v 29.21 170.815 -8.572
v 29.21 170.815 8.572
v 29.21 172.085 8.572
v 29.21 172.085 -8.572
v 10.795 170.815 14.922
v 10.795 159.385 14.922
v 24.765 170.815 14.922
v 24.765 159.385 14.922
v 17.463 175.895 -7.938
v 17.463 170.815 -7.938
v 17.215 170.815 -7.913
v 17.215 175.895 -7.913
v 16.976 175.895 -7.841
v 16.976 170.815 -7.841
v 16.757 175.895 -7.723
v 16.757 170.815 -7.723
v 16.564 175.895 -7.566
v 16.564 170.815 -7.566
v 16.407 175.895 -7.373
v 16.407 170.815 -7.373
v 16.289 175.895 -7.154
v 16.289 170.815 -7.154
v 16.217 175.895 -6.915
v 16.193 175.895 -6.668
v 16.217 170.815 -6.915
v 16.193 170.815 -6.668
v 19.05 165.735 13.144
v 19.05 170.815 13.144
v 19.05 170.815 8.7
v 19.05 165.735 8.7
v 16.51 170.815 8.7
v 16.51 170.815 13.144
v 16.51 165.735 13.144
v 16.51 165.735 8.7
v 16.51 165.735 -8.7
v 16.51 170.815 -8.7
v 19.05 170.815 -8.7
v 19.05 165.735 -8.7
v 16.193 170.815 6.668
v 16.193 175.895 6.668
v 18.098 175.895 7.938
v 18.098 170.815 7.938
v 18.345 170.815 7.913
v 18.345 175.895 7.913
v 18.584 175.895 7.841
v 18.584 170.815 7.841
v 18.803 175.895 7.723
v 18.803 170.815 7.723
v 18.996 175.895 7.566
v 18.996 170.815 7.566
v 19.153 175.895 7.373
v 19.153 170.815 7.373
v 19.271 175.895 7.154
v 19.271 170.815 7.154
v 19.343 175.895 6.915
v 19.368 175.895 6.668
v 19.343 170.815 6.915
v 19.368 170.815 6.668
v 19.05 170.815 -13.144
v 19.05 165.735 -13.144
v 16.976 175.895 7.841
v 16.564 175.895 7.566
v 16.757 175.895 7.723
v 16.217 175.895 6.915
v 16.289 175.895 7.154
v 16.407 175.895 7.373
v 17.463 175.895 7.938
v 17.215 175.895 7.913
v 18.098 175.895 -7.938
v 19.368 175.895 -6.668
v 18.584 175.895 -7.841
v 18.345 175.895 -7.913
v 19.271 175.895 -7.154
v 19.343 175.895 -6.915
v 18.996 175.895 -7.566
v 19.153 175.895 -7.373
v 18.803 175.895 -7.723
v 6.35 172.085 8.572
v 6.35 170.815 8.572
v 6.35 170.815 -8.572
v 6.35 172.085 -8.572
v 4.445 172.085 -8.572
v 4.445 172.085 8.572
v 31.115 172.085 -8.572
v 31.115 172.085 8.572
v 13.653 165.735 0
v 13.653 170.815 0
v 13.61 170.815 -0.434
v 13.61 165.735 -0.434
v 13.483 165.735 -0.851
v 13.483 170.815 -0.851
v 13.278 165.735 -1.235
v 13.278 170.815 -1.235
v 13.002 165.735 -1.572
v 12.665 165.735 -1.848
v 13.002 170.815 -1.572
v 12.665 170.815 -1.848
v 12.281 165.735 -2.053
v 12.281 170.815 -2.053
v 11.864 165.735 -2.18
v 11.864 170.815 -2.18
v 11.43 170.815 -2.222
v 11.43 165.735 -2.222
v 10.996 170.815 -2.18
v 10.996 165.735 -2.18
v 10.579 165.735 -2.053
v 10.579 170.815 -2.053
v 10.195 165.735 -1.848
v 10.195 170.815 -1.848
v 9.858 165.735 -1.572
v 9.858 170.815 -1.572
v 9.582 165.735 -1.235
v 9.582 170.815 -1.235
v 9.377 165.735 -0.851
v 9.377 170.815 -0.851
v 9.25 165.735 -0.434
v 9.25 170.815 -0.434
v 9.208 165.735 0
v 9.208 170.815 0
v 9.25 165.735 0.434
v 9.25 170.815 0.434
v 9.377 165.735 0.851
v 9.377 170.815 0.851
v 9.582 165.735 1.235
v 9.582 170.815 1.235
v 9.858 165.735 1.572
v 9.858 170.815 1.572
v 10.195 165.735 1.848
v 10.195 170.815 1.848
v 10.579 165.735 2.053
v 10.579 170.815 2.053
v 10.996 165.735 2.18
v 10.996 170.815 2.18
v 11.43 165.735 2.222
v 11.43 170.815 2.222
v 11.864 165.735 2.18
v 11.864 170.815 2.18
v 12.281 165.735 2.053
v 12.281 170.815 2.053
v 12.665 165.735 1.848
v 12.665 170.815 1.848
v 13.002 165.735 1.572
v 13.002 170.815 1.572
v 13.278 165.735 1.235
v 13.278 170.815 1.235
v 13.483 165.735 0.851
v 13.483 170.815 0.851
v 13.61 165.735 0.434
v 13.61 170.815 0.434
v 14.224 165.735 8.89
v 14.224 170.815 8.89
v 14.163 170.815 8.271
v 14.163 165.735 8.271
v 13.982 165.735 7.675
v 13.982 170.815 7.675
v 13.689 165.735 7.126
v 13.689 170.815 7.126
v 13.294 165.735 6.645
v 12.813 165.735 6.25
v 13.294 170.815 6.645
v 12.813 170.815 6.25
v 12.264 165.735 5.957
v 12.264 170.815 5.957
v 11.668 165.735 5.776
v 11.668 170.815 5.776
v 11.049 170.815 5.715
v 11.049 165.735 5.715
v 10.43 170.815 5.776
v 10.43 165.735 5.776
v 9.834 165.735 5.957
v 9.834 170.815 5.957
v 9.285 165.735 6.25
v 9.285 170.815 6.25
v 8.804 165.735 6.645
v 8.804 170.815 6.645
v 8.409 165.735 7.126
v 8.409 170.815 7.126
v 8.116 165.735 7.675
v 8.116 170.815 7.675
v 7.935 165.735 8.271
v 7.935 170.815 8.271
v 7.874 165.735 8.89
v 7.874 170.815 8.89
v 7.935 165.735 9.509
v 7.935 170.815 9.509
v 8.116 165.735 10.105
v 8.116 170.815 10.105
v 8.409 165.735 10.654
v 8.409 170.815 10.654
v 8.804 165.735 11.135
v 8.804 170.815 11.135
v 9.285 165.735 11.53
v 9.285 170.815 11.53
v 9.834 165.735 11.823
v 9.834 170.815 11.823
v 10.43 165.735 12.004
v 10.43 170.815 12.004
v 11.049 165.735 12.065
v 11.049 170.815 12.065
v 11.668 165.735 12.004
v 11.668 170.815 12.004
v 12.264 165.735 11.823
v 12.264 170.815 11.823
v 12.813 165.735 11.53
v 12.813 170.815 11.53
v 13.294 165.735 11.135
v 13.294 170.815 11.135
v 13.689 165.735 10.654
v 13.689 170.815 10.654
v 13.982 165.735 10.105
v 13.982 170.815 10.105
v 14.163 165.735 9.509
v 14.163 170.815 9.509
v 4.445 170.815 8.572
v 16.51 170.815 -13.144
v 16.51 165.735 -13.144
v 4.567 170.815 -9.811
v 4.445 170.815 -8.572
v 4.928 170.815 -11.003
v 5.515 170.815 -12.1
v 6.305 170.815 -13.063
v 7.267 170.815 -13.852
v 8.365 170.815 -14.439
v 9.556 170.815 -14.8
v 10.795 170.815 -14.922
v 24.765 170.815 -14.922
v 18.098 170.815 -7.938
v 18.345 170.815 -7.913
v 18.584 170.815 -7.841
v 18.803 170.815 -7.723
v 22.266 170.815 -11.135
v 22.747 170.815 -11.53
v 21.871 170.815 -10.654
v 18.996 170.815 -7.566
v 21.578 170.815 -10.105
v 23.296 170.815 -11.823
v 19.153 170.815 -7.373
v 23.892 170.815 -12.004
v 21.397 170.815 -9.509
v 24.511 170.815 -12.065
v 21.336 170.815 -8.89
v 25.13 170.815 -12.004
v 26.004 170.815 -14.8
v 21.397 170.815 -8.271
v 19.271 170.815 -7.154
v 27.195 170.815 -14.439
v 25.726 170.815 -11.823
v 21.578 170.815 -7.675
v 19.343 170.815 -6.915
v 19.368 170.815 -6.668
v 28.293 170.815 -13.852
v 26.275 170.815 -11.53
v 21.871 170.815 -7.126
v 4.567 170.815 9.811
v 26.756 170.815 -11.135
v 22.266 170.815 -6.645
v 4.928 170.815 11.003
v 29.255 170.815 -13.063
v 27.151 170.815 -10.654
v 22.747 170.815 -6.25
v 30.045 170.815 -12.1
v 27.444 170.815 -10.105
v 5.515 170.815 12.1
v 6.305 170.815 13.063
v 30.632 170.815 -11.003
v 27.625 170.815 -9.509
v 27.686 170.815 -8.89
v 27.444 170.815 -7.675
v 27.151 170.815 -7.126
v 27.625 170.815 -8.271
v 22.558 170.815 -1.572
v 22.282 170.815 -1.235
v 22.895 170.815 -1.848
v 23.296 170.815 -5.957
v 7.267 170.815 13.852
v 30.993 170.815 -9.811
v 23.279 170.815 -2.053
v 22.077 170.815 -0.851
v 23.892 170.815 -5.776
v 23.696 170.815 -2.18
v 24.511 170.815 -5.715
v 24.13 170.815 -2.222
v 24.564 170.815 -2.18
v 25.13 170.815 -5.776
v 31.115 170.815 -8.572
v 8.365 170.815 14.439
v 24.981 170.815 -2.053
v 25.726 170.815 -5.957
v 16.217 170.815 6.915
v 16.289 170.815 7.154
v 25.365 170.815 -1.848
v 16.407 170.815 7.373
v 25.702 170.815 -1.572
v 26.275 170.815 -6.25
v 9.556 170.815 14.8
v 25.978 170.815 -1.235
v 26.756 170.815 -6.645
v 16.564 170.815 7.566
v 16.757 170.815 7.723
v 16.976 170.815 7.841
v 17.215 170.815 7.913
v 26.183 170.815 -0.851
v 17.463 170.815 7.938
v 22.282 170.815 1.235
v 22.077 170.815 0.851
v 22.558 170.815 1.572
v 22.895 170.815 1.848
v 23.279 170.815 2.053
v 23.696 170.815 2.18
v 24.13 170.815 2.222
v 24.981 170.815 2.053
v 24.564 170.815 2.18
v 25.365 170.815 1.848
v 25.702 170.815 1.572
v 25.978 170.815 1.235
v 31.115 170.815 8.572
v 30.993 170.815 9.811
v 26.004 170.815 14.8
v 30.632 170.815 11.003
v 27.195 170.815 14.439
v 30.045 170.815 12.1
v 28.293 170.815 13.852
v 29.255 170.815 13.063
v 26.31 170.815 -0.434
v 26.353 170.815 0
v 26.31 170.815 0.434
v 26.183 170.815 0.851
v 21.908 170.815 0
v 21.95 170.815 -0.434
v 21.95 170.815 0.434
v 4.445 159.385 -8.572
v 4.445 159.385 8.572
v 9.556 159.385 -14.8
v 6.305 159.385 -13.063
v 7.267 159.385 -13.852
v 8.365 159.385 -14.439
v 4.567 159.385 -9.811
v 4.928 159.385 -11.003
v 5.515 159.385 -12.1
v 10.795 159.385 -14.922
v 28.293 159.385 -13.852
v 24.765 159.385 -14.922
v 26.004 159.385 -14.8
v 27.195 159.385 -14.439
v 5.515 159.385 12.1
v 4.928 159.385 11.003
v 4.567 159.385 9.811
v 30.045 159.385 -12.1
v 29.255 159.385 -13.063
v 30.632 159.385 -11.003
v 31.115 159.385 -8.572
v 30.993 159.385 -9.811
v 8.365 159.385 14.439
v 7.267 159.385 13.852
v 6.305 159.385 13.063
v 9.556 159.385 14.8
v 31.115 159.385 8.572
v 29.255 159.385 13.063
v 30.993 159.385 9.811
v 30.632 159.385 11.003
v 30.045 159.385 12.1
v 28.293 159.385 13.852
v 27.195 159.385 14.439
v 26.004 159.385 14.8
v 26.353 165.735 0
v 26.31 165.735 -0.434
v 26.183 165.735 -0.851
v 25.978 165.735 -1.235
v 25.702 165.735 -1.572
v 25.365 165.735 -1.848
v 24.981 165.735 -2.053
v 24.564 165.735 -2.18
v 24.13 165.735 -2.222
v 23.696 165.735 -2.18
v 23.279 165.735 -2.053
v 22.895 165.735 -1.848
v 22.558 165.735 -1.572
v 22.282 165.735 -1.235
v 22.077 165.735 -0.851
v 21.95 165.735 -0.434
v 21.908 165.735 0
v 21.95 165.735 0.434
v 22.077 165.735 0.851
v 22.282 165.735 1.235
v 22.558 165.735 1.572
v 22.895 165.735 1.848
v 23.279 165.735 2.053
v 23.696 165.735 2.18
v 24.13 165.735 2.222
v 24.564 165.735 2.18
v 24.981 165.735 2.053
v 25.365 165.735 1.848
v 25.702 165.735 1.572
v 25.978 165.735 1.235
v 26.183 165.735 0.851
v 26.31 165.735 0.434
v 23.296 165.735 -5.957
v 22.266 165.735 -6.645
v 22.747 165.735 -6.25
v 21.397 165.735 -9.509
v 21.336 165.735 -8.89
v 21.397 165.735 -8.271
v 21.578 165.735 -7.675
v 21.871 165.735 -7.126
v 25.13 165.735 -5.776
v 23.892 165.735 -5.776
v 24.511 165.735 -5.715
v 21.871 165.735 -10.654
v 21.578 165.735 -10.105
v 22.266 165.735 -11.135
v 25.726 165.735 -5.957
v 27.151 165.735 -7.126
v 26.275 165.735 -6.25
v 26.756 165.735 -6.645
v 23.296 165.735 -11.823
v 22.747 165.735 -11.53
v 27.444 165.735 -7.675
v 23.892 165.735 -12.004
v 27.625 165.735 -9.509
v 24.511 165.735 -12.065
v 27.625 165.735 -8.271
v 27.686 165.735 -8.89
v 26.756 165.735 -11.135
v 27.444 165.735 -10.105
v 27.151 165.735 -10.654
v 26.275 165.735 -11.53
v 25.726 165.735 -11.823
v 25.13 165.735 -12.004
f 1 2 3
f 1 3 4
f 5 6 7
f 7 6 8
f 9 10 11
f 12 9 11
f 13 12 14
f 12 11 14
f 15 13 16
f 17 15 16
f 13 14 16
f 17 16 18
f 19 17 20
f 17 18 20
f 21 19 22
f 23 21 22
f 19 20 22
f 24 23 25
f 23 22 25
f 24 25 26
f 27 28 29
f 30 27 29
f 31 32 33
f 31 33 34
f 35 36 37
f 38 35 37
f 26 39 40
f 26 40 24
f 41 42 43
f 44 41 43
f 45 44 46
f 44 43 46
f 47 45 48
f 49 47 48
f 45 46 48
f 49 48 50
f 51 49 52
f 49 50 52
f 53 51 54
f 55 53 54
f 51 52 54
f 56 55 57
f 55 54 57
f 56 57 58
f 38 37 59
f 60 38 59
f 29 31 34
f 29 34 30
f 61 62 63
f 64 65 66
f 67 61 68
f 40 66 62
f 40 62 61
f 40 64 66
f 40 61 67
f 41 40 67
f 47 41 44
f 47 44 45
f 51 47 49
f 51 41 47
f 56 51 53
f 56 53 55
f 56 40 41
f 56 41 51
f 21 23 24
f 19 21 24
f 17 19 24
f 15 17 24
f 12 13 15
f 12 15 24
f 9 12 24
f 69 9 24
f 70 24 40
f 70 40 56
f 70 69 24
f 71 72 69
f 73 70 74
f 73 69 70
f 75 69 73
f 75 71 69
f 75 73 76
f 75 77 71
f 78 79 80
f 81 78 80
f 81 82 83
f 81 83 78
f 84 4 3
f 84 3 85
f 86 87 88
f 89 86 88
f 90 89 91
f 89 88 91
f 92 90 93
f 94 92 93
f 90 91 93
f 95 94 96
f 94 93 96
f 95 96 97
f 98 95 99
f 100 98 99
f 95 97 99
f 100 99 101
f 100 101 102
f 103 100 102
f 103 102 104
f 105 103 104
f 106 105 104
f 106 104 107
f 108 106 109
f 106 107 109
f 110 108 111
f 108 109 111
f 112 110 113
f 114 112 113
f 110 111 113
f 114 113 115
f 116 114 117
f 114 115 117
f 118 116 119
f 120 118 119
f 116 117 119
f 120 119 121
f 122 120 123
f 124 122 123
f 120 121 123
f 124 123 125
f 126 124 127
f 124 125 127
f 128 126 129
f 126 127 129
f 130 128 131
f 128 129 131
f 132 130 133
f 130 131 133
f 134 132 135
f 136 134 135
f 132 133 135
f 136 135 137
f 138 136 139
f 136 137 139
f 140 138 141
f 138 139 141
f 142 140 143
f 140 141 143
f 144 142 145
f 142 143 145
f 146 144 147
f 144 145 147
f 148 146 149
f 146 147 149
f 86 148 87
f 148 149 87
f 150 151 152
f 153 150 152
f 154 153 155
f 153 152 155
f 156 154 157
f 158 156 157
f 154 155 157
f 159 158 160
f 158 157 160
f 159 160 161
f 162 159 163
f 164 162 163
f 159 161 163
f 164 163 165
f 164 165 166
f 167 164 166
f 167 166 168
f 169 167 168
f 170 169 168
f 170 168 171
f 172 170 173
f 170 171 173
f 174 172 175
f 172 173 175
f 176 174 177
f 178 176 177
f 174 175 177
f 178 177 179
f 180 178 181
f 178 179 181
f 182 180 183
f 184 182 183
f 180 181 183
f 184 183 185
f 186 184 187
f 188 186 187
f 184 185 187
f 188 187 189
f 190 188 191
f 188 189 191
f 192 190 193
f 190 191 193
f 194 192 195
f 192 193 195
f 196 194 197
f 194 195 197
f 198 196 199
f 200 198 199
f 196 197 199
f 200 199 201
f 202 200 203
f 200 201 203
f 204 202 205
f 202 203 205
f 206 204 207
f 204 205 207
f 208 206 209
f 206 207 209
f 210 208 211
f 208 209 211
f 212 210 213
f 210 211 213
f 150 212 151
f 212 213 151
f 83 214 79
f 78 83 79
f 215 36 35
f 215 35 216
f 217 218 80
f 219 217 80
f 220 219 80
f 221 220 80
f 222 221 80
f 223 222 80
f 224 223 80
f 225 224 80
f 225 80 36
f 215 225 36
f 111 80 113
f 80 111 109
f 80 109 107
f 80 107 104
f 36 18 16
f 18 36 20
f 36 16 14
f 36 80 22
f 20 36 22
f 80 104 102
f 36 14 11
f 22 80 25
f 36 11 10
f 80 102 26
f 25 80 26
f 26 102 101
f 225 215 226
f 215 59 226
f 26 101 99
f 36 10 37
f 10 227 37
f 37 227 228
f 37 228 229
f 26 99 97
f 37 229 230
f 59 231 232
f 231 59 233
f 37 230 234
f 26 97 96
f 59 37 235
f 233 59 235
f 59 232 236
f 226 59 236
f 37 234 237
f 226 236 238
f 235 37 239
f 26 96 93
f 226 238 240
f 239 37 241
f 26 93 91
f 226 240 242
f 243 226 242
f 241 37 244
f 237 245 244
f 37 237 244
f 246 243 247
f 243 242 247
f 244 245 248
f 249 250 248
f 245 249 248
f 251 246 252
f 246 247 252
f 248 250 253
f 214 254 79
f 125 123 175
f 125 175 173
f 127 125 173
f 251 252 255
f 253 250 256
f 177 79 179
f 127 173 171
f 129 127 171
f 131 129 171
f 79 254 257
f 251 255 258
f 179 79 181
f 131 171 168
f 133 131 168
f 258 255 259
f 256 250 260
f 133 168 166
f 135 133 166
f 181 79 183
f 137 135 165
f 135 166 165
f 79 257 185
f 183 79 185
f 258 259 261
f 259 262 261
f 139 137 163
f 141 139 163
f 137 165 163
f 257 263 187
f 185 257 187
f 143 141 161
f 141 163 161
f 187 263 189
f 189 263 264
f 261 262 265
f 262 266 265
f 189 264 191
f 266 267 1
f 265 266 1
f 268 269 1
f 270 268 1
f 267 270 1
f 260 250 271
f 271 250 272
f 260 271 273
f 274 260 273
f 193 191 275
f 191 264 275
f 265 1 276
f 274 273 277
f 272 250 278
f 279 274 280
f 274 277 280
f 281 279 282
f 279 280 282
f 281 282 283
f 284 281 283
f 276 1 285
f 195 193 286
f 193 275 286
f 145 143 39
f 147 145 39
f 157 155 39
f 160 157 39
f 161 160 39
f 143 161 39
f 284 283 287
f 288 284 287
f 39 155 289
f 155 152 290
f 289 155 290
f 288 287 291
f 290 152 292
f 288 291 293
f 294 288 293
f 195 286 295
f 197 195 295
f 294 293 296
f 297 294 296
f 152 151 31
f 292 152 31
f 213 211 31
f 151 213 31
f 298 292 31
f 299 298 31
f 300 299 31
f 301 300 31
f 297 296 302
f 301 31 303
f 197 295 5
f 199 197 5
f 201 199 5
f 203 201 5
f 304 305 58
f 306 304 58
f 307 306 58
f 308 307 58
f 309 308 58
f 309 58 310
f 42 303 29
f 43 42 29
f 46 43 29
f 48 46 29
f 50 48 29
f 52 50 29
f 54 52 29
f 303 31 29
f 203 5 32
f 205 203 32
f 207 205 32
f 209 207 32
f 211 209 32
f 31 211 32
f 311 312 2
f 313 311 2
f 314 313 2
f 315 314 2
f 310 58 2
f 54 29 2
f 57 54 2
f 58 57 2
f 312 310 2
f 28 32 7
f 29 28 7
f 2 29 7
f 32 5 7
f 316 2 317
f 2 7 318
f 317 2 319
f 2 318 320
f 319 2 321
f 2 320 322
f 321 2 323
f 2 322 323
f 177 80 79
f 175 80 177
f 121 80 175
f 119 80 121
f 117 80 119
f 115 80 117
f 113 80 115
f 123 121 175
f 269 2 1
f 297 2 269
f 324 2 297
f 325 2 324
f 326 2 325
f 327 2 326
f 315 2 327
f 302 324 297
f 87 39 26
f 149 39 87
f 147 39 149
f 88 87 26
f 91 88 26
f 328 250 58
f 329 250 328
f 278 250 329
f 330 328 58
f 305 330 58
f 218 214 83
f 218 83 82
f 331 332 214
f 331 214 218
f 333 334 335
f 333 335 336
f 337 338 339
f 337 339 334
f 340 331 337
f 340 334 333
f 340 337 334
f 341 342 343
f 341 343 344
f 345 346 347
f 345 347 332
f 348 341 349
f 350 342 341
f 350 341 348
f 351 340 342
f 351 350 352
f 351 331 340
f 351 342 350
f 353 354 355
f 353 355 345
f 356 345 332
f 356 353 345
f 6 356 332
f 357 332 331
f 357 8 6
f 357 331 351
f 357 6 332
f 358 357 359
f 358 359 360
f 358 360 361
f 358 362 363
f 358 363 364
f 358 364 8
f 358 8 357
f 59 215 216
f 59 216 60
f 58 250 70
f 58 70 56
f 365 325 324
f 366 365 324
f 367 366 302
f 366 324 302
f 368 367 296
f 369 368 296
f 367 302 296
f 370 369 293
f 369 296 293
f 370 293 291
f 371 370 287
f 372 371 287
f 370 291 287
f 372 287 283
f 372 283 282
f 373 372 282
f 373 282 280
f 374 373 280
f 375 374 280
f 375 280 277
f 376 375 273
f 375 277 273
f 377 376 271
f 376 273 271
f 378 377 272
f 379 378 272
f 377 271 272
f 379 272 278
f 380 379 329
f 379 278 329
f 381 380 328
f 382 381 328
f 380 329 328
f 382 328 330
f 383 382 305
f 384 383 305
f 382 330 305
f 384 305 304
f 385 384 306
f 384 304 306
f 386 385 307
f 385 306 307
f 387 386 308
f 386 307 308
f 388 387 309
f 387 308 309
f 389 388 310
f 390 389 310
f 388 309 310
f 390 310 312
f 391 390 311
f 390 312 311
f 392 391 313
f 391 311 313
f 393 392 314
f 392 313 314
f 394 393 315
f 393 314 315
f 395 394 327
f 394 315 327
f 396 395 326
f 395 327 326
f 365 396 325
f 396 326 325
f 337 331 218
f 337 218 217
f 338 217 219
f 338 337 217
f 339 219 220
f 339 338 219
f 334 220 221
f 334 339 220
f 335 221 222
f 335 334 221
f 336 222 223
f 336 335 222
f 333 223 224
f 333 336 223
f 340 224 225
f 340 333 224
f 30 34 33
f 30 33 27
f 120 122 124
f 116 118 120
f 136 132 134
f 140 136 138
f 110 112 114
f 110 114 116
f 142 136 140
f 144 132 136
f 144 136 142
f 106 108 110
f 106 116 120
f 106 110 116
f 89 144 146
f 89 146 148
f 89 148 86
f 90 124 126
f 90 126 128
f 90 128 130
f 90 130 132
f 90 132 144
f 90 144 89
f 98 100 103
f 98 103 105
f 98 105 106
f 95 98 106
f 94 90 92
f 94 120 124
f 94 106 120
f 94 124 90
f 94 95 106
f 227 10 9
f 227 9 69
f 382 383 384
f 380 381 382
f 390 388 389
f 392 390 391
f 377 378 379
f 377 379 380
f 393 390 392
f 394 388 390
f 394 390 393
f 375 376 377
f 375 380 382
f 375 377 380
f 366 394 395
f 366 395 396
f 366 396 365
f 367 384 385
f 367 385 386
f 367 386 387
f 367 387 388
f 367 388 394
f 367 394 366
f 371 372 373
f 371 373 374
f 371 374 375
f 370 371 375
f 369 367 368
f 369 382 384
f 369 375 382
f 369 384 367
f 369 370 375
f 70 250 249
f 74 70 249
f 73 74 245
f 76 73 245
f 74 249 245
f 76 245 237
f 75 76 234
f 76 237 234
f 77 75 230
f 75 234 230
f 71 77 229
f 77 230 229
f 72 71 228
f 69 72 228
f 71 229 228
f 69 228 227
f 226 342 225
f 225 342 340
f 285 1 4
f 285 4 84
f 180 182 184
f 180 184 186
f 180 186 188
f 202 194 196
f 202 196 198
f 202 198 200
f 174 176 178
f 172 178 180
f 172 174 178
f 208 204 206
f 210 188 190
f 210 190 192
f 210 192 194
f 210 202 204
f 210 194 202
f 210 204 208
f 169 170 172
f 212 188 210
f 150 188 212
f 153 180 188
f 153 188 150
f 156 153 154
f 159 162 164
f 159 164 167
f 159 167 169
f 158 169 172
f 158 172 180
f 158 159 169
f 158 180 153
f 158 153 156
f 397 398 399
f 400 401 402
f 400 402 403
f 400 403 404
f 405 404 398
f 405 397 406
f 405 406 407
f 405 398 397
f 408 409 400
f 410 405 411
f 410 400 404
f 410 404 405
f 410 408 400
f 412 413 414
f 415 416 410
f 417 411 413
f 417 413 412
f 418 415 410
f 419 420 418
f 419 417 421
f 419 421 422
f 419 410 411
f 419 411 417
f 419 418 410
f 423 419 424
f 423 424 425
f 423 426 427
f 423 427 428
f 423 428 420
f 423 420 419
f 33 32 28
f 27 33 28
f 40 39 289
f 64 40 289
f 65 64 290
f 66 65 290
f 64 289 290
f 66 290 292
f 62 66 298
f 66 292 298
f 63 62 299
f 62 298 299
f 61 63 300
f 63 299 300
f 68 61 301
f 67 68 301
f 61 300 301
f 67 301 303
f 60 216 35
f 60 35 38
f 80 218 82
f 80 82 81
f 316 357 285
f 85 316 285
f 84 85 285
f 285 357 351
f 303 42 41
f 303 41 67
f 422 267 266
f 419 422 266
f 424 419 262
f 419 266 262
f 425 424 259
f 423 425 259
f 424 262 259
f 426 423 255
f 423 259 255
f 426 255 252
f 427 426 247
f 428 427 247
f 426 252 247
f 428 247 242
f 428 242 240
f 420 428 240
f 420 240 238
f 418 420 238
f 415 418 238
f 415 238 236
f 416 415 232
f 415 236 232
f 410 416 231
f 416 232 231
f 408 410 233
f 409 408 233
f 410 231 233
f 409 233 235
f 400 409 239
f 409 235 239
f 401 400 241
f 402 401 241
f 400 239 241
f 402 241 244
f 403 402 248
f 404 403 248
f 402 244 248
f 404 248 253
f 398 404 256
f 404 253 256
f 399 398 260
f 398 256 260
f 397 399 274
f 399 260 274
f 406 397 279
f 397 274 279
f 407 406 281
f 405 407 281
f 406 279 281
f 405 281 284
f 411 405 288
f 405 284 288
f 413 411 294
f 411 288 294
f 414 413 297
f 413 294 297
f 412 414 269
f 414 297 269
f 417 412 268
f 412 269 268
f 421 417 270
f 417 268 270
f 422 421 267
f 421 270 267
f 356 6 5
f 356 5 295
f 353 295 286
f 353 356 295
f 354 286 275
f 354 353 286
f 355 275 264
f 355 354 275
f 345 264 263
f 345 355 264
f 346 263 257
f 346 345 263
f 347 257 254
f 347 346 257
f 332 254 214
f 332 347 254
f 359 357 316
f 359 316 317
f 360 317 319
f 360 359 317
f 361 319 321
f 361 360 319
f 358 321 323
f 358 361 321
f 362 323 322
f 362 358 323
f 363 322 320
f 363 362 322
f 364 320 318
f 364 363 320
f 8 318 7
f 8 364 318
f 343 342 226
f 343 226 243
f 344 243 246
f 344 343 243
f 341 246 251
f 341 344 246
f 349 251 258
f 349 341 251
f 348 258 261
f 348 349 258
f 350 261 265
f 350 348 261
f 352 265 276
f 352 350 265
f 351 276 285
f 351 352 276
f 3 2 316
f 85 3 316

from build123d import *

# Parameters (mm, degrees)
PAD014_DEPTH    = 11.43
SKETCH067_W     = 1.905
SKETCH067_H     = 17.145
PAD015_DEPTH    = 1.27
PAD016_DEPTH    = 5.08
SKETCH074_R     = 3.175
SKETCH074_R_2   = 2.2225
SKETCH074_W     = 2.54
SKETCH074_H     = 4.445
POCKET012_DEPTH = 5.08


with BuildPart() as part:
    # Sketch066 → Pad014 (new body)
    with BuildSketch(Plane.XZ):
        with BuildLine():
            ThreePointArc((-6.985, 14.9225), (-11.475128, 13.062628), (-13.335, 8.5725))
            Line((-13.335, -8.5725), (-13.335, 8.5725))
            ThreePointArc((-13.335, -8.5725), (-11.475128, -13.062628), (-6.985, -14.9225))
            Line((6.985, -14.9225), (-6.985, -14.9225))
            ThreePointArc((6.985, -14.9225), (11.475128, -13.062628), (13.335, -8.5725))
            Line((13.335, 8.5725), (13.335, -8.5725))
            ThreePointArc((13.335, 8.5725), (11.475128, 13.062628), (6.985, 14.9225))
            Line((-6.985, 14.9225), (6.985, 14.9225))
        make_face()
    extrude(amount=-PAD014_DEPTH)

    # Sketch067 (on Face10 of Pad014) → Pad015 (join)
    with BuildSketch(Plane(origin=(0, 11.43, 0), x_dir=(1, 0, 0), z_dir=(0, 1, 0))):
        with Locations((-12.3825, 0)):
            Rectangle(SKETCH067_W, SKETCH067_H)
        with Locations((12.3825, 0)):
            Rectangle(SKETCH067_W, SKETCH067_H)
    extrude(amount=PAD015_DEPTH)

    # Sketch068 (on Face5 of Pad015) → Pad016 (join)
    with BuildSketch(Plane(origin=(0, 11.43, 0), x_dir=(1, 0, 0), z_dir=(0, 1, 0))):
        with BuildLine():
            ThreePointArc((-0.3175, 7.9375), (-1.215526, 7.565526), (-1.5875, 6.6675))
            Line((-1.5875, -6.6675), (-1.5875, 6.6675))
            ThreePointArc((-1.5875, -6.6675), (-1.215526, -7.565526), (-0.3175, -7.9375))
            Line((0.3175, -7.9375), (-0.3175, -7.9375))
            ThreePointArc((0.3175, -7.9375), (1.215526, -7.565526), (1.5875, -6.6675))
            Line((1.5875, 6.6675), (1.5875, -6.6675))
            ThreePointArc((1.5875, 6.6675), (1.215526, 7.565526), (0.3175, 7.9375))
            Line((-0.3175, 7.9375), (0.3175, 7.9375))
        make_face()
    extrude(amount=PAD016_DEPTH)

    # Sketch074 (on Face5 of Pad016) → Pocket012 (cut)
    with BuildSketch(Plane(origin=(0, 11.43, 0), x_dir=(1, 0, 0), z_dir=(0, 1, 0))):
        with Locations((-6.731, -8.89)):
            Circle(SKETCH074_R)
        with Locations((6.731, 8.89)):
            Circle(SKETCH074_R)
        with Locations((-6.35, 0)):
            Circle(SKETCH074_R_2)
        with Locations((6.35, 0)):
            Circle(SKETCH074_R_2)
        with Locations((0, -10.922)):
            Rectangle(SKETCH074_W, SKETCH074_H)
        with Locations((0, 10.922)):
            Rectangle(SKETCH074_W, SKETCH074_H)
    extrude(amount=-POCKET012_DEPTH, mode=Mode.SUBTRACT)


with BuildPart() as part_1:
    # Body011 placement: moved
    add(part.part.moved(Location((17.78, 159.385, 0))))


solid = part_1.part
